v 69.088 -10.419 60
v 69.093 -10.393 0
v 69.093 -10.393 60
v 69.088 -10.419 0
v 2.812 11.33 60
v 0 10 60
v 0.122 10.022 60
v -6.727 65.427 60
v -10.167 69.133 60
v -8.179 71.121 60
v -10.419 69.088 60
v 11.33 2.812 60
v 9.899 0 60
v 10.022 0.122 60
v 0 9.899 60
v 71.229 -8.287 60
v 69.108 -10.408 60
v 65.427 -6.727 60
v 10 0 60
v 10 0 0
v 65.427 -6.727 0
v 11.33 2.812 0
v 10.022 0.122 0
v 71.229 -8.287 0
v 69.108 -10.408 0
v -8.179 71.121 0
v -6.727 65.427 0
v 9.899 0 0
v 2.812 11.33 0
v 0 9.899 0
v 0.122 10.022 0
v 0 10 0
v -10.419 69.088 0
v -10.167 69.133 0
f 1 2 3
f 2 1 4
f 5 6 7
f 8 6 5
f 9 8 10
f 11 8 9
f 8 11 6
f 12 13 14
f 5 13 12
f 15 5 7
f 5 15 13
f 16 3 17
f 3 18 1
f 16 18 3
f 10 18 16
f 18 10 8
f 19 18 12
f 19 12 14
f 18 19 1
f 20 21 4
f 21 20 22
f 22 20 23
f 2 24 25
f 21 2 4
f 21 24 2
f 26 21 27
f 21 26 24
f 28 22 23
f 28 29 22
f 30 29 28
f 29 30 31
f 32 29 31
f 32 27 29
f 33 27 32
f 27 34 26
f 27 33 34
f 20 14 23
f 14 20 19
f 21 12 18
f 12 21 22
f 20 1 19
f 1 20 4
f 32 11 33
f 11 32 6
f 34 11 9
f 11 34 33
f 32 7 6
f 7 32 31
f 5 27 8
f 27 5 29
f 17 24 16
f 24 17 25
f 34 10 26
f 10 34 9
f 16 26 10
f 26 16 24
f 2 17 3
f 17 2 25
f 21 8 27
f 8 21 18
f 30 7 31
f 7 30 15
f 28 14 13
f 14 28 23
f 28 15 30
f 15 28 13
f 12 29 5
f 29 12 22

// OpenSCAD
height = 60;
width = 60;
wallThickness = 3;

translate([10, 0, 0])
rotate([0, 0, -10])
cube([width, wallThickness, height]);
translate([0, 10, 0])
rotate([0, 0, 10])
cube([wallThickness, width, height]);

translate([-10.3, width + 9, 0])
rotate([0, 0, -45])
cube([112.3, wallThickness, height]);

/*
difference(){
    translate([3, -20, 0])
    rotate([0, 0, 10])
    cube([width + 10, width + 30, wallThickness]);
    
    rotate([90, 0, -45])
    translate([-9, 0, -7])
    cube([25, height, wallThickness * 2]);
    
    translate([-10, width + 10, 0])
    rotate([0, 0, -45])
    cube([width + width/2 + 30, 60, wallThickness]);
    
    rotate([0, 0, -100])
    translate([-4, -10, 0])
    cube([width, width + 20, wallThickness]);
    
    translate([0, 10, 0])
    rotate([0, 0, 100])
    cube([width, width, wallThickness]);
}
*/

rotate([90, 0, -45])
translate([-7, 0, -10])
cube([14, height, wallThickness]);
